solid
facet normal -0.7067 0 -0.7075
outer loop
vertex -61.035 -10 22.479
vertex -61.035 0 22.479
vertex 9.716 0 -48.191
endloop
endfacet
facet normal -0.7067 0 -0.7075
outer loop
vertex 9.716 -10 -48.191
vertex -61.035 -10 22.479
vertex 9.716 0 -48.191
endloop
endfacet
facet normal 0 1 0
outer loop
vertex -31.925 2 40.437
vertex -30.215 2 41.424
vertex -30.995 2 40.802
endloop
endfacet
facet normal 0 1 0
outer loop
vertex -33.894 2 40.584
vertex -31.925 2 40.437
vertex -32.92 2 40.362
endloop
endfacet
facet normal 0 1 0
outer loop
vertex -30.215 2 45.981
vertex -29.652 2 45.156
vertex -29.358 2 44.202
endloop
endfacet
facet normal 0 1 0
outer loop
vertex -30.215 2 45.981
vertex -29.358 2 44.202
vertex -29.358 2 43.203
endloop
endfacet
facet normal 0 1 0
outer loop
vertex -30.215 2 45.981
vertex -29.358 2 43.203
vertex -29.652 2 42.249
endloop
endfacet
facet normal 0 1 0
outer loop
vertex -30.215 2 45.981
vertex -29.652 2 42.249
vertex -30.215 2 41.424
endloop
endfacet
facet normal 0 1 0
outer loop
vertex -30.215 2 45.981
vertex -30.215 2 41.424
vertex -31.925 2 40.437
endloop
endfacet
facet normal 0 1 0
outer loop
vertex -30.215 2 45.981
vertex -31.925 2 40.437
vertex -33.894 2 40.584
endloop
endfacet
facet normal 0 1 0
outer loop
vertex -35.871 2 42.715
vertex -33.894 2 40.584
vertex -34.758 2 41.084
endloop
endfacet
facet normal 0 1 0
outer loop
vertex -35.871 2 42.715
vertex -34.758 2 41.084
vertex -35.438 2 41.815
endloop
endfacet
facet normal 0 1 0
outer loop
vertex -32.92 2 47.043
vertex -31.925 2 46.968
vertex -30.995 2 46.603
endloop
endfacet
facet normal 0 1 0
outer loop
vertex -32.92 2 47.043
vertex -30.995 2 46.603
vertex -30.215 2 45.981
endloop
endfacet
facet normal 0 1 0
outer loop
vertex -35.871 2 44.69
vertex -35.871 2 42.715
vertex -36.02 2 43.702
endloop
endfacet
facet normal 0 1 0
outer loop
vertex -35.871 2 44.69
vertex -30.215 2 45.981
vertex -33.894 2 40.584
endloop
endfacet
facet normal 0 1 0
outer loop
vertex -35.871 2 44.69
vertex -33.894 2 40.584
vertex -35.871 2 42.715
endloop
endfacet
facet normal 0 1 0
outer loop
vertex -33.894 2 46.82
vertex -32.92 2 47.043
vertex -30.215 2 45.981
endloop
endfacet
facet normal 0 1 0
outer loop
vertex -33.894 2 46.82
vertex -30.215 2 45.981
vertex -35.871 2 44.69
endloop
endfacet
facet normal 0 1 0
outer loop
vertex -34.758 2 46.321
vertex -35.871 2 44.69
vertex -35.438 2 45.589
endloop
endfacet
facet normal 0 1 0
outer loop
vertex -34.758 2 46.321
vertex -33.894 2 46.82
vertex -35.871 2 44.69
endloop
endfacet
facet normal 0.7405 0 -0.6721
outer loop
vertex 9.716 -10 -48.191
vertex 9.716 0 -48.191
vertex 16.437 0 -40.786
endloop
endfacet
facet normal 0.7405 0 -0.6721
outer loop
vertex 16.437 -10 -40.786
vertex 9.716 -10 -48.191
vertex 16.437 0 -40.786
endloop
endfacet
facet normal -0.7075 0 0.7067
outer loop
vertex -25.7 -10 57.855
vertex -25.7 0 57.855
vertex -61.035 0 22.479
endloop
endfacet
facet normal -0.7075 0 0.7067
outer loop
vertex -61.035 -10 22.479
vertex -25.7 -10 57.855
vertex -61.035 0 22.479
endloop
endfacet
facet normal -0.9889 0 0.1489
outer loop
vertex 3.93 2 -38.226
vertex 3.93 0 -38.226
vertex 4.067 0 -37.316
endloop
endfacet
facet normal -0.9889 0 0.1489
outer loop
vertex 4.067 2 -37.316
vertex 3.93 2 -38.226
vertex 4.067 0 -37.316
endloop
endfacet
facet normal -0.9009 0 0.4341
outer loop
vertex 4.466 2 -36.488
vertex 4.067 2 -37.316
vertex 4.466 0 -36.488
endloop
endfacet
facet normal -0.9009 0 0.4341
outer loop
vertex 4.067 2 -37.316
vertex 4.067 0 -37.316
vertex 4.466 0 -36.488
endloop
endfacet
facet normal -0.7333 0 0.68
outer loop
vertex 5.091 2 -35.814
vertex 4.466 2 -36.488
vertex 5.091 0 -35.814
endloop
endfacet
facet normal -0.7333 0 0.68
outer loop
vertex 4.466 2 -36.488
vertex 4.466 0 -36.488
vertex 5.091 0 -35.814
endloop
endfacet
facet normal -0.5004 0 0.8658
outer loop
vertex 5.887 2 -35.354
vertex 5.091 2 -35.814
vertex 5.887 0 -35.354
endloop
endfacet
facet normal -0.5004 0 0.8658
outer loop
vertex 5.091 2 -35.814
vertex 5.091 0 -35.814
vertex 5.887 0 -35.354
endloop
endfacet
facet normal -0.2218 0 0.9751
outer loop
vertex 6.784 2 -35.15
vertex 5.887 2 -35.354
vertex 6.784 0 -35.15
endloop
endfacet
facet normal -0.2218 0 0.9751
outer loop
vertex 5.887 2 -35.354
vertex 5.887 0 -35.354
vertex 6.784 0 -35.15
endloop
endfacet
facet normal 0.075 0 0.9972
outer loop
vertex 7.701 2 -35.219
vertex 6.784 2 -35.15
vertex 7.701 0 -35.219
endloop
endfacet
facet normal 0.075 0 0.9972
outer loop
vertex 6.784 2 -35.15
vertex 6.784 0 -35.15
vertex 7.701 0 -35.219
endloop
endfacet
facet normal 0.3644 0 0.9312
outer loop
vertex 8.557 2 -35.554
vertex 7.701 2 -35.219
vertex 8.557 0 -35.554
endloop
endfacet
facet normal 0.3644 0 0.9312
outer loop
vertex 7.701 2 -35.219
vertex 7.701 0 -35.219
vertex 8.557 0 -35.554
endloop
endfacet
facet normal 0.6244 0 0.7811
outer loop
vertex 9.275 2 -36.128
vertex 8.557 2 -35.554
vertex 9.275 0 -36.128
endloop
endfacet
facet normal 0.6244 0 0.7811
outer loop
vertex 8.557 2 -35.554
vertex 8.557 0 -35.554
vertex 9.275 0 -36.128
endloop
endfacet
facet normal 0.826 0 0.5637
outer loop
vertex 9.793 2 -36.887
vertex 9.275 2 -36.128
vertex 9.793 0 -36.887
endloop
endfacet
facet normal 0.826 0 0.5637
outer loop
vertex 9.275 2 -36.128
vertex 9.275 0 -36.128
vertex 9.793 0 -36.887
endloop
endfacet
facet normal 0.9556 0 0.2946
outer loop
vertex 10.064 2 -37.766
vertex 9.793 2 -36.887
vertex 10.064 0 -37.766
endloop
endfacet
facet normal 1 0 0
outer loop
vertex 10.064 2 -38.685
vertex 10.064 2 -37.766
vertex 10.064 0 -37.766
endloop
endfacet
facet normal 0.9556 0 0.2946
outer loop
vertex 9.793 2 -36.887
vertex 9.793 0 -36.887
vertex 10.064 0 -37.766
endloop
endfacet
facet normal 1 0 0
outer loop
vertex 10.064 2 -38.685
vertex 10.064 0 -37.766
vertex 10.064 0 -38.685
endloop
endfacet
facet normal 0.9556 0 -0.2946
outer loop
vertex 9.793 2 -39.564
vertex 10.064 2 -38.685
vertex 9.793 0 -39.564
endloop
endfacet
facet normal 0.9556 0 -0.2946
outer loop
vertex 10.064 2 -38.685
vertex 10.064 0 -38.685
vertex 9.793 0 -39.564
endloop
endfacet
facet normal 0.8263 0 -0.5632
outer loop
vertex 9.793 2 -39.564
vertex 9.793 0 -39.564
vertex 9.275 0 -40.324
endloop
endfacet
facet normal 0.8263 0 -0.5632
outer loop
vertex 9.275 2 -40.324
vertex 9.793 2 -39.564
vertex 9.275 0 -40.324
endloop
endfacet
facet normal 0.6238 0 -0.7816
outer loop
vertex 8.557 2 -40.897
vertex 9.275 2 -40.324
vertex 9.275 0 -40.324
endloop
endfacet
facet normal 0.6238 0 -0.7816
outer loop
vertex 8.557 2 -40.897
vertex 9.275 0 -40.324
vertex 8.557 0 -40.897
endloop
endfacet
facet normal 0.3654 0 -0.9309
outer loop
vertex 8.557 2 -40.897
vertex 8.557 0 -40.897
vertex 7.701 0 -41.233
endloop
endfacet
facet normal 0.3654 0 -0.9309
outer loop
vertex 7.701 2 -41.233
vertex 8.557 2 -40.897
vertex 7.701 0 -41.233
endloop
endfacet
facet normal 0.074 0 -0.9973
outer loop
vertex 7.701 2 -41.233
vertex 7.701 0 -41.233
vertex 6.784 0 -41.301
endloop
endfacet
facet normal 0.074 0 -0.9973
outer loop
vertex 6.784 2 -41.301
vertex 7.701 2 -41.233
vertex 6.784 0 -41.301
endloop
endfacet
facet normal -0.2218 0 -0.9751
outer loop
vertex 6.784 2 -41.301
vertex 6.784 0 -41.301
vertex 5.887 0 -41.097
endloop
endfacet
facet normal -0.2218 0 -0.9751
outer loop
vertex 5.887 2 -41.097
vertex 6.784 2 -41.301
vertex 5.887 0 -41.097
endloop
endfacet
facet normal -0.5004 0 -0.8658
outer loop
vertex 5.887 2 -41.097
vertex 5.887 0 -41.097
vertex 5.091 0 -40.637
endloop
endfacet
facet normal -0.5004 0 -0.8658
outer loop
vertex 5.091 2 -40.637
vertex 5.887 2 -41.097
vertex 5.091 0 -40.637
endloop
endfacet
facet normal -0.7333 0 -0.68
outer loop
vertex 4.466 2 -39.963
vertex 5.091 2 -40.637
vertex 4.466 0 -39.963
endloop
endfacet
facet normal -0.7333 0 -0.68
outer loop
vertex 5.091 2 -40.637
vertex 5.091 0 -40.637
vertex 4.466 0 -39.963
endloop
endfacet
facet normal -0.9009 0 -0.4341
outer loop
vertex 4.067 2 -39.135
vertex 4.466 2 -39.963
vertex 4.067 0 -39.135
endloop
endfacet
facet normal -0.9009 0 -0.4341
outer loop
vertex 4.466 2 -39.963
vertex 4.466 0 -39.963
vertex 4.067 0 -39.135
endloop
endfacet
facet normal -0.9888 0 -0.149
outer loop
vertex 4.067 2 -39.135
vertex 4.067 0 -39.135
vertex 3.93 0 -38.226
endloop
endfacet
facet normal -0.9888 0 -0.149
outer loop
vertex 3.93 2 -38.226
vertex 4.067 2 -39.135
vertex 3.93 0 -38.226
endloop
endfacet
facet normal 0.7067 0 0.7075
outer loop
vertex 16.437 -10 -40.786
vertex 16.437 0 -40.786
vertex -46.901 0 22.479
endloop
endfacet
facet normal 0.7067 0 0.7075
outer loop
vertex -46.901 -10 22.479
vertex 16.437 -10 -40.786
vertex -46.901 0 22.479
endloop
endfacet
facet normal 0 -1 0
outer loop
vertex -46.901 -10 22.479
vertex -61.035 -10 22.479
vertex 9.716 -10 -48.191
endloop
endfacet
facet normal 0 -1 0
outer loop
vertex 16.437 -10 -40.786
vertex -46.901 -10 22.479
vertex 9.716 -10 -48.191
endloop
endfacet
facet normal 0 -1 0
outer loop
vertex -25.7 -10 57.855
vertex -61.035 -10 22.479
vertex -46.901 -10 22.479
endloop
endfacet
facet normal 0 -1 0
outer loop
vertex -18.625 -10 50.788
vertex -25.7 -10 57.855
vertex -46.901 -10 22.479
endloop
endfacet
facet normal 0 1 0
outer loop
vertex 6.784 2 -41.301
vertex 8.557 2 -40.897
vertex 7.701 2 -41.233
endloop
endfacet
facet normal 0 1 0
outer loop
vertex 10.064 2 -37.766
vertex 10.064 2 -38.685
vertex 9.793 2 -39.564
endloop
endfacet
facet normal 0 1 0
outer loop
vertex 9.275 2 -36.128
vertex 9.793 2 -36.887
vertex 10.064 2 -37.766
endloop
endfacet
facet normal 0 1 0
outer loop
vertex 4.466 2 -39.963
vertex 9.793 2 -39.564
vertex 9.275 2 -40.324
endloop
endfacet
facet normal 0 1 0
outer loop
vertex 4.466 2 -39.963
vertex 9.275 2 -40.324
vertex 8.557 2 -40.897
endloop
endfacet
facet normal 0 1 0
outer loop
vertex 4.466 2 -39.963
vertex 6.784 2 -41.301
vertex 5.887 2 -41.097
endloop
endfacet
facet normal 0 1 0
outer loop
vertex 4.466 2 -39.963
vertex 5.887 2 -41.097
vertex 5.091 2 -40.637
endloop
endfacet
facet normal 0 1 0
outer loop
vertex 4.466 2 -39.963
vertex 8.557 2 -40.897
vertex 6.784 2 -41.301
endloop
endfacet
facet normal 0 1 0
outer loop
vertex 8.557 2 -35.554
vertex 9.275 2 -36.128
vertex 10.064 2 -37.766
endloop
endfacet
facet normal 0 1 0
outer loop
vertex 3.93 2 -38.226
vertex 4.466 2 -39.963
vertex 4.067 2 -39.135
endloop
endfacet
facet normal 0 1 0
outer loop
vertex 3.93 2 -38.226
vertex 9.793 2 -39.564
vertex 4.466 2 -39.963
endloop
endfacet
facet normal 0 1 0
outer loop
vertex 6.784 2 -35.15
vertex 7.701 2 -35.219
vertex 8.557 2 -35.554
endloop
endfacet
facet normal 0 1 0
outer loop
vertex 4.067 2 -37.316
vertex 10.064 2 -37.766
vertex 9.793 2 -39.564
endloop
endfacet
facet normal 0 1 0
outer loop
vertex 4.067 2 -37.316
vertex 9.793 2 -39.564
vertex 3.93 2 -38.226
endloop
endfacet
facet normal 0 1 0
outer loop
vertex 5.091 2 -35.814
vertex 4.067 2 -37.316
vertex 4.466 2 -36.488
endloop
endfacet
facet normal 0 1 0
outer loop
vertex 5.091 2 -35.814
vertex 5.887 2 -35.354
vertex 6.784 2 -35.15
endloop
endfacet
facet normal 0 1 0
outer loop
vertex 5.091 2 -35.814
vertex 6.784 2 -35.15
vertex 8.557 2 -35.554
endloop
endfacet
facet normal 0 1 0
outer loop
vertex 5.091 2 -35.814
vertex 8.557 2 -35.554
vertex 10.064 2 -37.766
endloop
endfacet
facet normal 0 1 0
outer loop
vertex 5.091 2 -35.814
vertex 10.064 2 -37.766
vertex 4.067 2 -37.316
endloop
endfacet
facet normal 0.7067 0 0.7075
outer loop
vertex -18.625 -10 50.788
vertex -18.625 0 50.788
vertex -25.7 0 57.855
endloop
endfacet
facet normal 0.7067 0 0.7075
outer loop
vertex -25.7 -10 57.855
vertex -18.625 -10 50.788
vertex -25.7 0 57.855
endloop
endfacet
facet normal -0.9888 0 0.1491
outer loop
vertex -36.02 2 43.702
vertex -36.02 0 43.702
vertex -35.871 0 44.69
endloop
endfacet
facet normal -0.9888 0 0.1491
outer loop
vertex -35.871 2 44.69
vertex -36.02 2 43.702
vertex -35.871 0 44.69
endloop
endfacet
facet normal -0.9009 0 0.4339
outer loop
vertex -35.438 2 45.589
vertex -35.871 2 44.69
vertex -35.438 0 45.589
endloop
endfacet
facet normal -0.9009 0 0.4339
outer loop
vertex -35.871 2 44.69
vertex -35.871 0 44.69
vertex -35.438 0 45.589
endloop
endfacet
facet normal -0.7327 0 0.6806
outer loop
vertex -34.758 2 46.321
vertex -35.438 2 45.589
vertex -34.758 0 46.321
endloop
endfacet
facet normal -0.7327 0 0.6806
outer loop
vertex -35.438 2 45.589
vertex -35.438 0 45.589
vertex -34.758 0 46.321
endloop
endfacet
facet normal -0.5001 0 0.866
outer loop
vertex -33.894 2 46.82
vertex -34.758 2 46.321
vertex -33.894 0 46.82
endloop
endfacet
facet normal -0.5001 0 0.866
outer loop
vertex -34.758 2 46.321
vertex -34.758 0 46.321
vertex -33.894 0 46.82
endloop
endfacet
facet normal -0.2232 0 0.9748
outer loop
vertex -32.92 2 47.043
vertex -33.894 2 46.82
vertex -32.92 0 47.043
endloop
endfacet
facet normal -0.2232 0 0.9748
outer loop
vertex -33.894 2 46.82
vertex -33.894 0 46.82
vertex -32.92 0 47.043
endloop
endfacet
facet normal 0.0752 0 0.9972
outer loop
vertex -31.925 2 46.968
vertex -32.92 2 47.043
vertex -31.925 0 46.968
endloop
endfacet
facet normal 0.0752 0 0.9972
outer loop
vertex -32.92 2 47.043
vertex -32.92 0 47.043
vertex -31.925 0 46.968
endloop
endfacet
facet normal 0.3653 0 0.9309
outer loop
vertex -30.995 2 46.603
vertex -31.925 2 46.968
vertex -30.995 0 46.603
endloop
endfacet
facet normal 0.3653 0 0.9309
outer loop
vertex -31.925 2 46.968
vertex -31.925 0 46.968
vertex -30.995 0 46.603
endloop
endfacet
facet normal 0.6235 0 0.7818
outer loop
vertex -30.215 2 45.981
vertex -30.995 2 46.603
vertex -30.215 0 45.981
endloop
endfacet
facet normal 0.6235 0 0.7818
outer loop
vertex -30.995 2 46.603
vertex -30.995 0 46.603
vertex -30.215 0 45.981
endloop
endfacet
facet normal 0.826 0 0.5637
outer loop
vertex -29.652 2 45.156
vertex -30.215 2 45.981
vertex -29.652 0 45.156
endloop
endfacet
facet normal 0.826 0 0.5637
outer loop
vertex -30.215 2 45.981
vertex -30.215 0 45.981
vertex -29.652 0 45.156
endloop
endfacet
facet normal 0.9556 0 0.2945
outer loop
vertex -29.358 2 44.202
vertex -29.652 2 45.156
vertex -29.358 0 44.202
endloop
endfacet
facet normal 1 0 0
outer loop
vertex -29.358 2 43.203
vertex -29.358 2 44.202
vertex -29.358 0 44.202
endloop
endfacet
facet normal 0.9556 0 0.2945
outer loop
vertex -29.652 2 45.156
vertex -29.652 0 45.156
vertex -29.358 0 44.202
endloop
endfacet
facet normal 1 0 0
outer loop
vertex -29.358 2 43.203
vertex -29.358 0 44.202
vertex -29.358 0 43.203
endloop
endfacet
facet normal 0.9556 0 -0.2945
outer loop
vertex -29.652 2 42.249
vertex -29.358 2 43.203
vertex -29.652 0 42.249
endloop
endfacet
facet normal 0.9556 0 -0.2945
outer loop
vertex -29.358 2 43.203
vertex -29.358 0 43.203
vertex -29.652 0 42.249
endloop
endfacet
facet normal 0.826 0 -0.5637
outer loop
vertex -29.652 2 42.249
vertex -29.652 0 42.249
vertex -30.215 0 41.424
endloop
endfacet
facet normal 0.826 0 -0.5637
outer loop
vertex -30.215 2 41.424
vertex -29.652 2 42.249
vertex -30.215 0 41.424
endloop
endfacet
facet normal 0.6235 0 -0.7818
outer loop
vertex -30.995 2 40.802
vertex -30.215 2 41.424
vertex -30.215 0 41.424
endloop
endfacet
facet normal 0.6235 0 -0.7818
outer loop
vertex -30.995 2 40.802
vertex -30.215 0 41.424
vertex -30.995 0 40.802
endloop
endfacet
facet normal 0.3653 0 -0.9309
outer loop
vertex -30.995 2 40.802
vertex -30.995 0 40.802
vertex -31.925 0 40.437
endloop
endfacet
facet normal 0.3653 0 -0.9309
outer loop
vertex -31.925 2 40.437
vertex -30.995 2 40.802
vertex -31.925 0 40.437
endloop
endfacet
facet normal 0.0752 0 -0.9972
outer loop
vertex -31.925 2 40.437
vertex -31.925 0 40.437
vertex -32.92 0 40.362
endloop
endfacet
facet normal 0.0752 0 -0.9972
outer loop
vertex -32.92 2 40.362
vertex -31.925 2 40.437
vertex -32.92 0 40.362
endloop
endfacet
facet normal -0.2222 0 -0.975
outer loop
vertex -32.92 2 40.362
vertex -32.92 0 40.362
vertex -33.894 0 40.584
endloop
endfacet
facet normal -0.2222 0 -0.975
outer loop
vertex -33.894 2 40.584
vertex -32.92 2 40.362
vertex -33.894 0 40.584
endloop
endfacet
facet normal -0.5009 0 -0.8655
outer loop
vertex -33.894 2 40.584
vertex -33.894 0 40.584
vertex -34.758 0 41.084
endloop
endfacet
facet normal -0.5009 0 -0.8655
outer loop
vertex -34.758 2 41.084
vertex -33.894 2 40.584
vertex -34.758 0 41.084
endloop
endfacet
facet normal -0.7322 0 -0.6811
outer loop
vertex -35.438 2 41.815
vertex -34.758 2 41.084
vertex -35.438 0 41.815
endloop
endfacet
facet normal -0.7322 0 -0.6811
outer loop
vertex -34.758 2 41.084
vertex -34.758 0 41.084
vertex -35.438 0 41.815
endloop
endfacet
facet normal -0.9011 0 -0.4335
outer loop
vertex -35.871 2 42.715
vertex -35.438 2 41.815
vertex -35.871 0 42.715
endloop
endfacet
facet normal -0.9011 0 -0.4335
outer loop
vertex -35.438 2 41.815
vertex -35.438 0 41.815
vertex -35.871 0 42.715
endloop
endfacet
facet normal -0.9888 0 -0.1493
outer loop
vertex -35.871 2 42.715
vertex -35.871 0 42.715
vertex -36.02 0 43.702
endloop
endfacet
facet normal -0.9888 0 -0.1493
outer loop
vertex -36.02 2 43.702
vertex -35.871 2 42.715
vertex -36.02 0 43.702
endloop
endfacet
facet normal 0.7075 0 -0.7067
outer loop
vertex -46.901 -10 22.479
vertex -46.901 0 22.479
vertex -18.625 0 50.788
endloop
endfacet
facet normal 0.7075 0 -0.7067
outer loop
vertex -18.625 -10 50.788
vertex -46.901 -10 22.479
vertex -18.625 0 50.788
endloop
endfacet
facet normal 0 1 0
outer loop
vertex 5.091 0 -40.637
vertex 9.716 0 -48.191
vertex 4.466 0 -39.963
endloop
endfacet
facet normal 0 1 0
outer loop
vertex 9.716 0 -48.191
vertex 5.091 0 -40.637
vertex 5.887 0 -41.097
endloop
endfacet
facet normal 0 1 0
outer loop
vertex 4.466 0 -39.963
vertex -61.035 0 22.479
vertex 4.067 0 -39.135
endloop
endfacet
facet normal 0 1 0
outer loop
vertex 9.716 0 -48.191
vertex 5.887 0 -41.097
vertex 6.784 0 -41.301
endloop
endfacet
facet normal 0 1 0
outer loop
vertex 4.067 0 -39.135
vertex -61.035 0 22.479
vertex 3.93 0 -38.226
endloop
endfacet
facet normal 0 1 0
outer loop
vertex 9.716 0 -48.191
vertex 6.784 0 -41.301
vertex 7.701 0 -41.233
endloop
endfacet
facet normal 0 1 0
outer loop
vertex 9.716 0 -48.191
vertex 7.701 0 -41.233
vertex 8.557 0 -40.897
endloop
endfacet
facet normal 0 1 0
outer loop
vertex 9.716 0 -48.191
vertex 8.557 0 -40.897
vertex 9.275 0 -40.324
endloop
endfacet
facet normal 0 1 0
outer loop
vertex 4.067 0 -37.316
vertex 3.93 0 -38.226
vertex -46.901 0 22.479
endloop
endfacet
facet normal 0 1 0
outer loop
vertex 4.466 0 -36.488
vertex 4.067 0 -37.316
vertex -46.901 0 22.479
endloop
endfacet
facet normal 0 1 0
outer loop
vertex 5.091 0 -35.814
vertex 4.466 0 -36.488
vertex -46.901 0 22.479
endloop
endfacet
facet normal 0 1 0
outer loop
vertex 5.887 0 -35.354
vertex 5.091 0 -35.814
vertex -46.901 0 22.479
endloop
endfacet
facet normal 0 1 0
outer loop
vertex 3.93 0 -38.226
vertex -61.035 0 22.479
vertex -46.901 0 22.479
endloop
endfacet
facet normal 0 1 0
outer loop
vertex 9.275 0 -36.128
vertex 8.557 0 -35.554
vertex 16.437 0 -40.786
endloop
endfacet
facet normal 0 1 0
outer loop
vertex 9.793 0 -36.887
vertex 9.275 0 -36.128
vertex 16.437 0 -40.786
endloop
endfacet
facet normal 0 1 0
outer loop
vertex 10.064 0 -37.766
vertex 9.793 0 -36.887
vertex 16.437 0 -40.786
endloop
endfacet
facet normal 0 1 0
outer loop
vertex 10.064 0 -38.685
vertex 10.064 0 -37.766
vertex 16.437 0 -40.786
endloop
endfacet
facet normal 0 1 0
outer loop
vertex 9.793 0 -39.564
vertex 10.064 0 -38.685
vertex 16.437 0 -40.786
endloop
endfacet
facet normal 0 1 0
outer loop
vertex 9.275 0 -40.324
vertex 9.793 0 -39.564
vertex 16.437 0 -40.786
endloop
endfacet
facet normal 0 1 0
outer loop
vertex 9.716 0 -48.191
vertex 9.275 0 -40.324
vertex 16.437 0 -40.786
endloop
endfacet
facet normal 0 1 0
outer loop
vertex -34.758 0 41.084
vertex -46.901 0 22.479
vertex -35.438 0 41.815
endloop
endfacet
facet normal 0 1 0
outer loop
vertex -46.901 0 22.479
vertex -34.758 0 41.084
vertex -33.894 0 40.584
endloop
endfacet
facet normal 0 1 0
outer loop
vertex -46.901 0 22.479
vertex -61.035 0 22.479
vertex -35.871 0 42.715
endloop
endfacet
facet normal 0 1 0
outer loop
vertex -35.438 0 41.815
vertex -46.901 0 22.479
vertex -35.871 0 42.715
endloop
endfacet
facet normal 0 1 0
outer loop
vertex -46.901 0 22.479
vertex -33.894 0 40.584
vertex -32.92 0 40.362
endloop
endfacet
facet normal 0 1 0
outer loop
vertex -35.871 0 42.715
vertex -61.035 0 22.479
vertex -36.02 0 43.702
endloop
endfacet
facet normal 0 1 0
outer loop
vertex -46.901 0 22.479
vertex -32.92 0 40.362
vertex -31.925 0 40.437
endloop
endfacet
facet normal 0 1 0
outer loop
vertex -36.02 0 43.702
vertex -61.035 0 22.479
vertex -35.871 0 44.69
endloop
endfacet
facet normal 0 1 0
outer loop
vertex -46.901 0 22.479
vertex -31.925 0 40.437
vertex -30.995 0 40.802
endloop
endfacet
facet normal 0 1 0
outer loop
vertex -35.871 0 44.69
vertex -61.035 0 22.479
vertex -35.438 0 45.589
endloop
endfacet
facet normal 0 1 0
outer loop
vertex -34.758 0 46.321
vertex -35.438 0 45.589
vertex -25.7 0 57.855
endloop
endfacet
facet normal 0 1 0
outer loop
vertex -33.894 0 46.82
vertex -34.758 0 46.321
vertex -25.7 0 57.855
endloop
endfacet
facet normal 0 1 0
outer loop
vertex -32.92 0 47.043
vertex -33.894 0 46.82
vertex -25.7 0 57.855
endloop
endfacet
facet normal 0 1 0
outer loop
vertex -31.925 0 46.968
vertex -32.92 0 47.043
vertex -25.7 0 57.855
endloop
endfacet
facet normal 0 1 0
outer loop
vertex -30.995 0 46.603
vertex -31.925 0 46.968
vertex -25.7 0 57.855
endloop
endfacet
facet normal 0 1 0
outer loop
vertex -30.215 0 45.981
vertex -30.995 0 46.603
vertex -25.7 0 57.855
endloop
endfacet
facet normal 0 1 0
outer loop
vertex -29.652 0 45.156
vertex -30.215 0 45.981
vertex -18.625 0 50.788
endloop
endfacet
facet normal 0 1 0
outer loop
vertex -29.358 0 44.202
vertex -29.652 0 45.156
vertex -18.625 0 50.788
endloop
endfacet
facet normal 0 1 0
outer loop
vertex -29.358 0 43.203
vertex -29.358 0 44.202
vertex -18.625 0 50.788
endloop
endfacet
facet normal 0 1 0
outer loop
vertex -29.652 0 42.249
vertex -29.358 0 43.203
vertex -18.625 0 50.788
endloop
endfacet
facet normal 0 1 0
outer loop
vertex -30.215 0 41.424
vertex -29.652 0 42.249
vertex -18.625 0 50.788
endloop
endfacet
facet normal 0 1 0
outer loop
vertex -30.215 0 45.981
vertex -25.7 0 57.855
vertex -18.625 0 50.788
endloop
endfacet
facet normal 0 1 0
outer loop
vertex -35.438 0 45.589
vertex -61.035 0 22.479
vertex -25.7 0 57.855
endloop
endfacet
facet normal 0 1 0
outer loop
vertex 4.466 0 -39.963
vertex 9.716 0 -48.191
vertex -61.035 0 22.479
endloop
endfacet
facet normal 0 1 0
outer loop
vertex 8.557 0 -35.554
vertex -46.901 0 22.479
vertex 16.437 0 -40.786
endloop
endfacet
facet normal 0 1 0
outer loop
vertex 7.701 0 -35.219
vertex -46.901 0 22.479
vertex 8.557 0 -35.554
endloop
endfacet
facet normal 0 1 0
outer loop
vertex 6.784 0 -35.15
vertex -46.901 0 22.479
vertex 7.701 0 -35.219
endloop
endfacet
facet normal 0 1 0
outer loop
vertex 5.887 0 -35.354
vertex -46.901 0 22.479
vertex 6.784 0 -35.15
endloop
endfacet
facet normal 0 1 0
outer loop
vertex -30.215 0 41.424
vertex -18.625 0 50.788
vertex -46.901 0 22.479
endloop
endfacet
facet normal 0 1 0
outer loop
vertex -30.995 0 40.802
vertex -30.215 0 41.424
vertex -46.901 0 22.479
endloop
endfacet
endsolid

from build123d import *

# Parameters (mm, degrees)
F1_DEPTH = 10
F2_R     = 3.084409
F2_R_2   = 3.349591
F3_DEPTH = 2


with BuildPart() as f1:
    # F0 (on Front) → F1 (new body)
    with BuildSketch(Plane.XZ):
        Polygon((-25.699907, 57.854638), (-61.035037, 22.479102), (9.716036, -48.191159), (16.436929, -40.786458), (-46.900976, 22.479102), (-18.624799, 50.787612), align=None)
    extrude(amount=F1_DEPTH)

    # F2 (on face) → F3 (join)
    with BuildSketch(Plane(origin=(0, 0, 0), x_dir=(-1, 0, 0), z_dir=(0, 1, 0))):
        with Locations((-7.014304, -38.225602)):
            Circle(F2_R)
        with Locations((32.67004, 43.702345)):
            Circle(F2_R_2)
    extrude(amount=F3_DEPTH)


solid = f1.part
